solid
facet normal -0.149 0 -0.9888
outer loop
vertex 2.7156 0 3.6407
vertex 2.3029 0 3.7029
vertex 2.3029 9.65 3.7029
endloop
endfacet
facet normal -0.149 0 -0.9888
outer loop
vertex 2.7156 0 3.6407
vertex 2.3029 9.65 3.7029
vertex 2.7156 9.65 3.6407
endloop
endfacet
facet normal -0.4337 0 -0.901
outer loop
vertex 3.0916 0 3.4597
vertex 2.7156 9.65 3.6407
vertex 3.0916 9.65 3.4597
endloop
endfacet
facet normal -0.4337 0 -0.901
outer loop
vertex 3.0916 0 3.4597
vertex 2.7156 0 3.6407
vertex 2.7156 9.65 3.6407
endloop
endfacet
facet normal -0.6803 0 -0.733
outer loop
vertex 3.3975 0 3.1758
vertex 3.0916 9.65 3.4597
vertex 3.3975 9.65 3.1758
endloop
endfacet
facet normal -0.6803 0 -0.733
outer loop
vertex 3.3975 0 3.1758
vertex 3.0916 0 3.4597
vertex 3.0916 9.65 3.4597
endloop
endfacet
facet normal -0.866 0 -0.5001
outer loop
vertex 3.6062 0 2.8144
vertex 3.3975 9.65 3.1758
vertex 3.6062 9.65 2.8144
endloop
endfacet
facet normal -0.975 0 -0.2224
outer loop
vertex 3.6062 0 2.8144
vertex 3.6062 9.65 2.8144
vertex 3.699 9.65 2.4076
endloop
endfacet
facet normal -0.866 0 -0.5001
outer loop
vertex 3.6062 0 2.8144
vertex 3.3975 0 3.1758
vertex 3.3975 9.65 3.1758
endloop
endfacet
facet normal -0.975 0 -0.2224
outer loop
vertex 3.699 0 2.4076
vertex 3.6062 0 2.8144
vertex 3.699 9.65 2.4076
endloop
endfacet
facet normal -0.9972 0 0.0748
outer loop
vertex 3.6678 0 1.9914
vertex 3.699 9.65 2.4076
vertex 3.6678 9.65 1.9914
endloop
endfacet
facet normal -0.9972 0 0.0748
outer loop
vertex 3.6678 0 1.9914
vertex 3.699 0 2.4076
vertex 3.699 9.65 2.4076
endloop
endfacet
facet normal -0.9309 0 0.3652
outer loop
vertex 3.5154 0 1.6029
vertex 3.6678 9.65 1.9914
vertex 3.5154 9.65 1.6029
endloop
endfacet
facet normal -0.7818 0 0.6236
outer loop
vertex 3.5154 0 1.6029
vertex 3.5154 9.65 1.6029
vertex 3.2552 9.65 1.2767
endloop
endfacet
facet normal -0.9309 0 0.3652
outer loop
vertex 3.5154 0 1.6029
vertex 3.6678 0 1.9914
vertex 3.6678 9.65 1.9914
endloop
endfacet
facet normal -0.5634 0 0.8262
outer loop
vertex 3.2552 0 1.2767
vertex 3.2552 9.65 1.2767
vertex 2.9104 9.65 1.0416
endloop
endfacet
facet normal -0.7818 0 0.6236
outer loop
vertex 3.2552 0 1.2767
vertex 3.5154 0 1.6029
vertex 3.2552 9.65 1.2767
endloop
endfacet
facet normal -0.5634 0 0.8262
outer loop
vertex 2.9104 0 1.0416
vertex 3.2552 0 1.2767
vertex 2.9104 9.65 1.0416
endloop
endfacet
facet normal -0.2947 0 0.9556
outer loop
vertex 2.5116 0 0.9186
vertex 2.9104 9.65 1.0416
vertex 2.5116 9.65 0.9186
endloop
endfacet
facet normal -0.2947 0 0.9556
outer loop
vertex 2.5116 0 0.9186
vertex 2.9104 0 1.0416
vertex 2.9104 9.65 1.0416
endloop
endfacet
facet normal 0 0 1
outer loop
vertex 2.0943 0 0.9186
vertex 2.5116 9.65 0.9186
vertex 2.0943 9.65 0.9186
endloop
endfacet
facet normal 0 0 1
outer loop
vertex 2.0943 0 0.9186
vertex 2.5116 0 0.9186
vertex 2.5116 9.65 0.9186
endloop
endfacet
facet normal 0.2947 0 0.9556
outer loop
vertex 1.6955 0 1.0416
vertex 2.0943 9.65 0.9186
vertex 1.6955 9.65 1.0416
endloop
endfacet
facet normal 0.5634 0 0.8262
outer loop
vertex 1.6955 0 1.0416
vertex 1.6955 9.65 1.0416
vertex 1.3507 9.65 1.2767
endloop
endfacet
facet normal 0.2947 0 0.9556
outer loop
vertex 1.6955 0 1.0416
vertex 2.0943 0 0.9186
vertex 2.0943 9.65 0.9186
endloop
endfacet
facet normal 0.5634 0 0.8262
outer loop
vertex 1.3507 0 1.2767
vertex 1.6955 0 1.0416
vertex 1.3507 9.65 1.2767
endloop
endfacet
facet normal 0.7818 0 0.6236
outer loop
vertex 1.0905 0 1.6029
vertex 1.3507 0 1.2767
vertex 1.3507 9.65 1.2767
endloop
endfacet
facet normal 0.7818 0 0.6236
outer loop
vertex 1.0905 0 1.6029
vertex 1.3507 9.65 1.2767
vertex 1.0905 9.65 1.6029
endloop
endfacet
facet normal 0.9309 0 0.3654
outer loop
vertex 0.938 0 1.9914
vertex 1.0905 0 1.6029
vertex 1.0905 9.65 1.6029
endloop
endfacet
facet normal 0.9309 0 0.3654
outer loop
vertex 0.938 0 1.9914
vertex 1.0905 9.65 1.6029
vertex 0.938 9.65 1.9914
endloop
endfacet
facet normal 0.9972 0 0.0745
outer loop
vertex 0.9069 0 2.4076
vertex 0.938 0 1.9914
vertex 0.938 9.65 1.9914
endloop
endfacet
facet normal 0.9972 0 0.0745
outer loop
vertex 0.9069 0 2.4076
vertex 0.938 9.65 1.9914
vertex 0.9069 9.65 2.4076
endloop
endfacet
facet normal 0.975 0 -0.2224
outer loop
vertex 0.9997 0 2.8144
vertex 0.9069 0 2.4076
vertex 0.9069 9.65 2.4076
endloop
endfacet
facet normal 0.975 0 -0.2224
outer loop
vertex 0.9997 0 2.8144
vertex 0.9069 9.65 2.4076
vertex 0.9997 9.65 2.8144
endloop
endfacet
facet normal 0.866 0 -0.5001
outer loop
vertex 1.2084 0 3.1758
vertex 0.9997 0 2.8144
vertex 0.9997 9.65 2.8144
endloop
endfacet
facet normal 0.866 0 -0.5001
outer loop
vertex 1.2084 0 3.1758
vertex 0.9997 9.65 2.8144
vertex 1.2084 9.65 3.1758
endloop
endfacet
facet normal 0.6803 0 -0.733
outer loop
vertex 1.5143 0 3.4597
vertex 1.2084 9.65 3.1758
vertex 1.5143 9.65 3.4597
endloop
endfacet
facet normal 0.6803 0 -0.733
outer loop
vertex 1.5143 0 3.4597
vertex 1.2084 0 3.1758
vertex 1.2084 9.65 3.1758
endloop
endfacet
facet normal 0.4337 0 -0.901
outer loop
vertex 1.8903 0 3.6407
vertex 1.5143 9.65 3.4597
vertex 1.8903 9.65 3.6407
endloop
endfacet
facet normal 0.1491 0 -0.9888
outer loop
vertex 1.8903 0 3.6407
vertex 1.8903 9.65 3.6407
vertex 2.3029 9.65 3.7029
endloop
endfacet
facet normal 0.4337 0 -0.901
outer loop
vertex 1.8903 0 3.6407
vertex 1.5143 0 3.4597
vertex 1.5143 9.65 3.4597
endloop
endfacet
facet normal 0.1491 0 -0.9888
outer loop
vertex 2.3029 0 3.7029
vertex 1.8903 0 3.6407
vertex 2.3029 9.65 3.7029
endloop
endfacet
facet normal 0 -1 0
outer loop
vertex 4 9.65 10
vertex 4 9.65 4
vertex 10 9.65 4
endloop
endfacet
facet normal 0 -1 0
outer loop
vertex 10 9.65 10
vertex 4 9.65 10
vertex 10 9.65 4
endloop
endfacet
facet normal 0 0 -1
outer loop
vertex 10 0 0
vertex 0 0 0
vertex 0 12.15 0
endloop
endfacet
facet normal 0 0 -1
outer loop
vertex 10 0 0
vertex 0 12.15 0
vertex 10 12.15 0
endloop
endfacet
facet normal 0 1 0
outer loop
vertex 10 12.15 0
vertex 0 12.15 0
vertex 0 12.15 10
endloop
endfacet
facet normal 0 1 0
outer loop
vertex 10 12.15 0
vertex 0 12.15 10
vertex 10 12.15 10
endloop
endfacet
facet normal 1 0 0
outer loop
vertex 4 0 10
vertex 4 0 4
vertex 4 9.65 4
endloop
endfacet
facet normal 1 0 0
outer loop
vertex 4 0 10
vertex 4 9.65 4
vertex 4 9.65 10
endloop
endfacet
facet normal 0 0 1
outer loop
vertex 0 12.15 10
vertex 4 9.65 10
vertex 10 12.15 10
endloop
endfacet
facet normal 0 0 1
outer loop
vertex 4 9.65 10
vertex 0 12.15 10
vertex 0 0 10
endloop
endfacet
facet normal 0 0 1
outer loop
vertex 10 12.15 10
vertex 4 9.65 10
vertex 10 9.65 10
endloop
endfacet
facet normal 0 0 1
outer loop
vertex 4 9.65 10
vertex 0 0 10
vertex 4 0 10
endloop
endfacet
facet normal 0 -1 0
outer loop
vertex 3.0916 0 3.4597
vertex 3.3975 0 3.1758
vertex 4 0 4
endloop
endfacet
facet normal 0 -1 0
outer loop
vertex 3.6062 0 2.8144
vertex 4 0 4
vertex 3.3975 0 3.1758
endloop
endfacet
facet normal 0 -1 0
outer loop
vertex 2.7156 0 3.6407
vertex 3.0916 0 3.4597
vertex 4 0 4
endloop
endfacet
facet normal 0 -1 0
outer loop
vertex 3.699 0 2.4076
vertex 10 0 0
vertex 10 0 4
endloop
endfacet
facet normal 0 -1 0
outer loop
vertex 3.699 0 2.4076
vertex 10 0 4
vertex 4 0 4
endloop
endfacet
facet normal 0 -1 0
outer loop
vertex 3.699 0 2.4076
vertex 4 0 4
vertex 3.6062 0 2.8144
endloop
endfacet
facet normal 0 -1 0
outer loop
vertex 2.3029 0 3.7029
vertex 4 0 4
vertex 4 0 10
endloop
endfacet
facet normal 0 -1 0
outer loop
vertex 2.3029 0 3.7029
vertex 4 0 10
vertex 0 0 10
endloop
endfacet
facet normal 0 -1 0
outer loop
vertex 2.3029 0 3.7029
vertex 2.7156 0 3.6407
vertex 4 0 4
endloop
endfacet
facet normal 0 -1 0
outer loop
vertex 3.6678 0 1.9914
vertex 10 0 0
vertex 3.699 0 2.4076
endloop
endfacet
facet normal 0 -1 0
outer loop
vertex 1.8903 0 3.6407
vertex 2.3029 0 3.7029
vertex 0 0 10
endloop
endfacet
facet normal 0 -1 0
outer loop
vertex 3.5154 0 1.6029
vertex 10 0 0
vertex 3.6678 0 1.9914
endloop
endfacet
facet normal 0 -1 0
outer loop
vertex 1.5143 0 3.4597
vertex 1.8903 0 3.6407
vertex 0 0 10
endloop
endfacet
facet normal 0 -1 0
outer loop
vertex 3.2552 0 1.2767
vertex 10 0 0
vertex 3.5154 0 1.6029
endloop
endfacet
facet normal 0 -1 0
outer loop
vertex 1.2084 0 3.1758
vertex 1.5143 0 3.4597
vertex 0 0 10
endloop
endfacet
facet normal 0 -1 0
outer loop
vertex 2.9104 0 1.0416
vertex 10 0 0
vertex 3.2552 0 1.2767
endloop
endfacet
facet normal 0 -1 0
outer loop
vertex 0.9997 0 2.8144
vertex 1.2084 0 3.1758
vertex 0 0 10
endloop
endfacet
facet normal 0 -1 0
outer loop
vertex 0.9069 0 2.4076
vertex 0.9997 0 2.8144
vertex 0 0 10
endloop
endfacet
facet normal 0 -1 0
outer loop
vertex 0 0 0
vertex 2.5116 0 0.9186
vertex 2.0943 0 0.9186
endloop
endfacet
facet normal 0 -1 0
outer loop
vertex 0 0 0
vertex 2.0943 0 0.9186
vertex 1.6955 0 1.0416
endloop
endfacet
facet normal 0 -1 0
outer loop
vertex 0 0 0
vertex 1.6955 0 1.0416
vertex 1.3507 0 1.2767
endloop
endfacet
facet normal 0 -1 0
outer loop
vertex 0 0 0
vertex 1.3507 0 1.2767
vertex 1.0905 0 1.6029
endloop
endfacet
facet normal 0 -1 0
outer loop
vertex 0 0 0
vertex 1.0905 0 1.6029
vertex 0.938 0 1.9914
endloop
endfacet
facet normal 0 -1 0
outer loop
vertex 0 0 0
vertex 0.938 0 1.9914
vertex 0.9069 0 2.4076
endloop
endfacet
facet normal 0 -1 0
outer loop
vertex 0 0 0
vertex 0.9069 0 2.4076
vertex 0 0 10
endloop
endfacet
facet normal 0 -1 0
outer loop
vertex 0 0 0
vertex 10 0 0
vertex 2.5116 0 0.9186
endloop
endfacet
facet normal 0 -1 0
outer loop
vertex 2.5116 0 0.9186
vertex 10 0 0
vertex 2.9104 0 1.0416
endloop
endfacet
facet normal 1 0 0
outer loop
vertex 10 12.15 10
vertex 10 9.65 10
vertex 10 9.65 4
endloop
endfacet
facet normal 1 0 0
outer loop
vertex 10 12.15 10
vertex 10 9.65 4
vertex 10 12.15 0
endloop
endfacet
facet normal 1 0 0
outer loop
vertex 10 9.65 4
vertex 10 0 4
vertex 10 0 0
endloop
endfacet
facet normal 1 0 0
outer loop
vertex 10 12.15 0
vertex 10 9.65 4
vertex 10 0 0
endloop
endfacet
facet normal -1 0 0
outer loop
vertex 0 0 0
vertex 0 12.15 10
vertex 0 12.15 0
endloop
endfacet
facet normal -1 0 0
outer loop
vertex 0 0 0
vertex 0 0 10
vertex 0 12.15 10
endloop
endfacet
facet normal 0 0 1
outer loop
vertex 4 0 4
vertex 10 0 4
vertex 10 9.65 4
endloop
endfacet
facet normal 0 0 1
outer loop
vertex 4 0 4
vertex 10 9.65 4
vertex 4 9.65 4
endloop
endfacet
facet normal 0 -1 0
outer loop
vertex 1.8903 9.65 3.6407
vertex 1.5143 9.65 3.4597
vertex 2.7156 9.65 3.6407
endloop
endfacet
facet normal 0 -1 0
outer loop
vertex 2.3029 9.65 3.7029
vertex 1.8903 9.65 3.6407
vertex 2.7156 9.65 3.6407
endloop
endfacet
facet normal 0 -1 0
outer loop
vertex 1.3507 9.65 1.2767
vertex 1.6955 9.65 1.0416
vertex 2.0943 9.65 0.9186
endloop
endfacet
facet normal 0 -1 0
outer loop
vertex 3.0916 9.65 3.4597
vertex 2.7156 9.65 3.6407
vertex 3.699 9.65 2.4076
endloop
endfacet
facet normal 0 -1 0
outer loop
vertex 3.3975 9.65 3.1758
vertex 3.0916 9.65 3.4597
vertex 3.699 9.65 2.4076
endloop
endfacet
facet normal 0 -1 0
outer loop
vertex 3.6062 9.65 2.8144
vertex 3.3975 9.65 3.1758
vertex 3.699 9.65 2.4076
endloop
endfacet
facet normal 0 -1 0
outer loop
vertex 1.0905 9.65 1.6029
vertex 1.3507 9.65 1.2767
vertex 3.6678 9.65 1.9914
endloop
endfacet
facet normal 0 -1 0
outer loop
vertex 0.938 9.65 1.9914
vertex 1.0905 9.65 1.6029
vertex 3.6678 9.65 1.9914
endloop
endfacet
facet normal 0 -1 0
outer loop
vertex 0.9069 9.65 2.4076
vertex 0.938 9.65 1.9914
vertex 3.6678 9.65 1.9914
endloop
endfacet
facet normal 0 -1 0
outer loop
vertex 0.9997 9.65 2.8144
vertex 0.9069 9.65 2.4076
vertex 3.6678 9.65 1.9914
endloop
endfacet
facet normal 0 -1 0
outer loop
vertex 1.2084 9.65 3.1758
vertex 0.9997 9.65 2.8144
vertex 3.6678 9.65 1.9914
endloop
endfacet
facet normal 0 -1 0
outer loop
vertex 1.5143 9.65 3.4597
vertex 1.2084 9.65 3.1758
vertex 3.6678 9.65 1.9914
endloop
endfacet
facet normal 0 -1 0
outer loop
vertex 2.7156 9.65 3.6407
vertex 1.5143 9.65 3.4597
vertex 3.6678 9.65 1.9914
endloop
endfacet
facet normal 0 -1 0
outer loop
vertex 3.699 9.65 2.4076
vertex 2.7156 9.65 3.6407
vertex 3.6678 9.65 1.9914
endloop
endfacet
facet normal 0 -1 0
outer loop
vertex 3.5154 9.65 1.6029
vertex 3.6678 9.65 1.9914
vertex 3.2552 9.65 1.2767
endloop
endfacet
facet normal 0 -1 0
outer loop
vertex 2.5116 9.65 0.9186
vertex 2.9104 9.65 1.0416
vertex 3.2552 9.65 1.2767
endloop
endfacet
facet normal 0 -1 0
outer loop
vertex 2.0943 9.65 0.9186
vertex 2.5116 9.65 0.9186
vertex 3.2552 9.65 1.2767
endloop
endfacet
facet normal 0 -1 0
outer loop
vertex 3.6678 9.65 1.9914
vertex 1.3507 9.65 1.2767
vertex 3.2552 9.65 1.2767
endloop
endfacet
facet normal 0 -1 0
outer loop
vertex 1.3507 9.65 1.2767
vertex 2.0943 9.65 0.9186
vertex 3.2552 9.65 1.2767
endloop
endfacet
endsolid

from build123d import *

# Parameters (mm, degrees)
SKETCH1_R           = 1.4
BOSS_EXTRUDE1_DEPTH = 9.65
SKETCH2_W           = 10
SKETCH2_H           = 10
BOSS_EXTRUDE2_DEPTH = 2.5


with BuildPart() as part:
    # Sketch1 → Boss-Extrude1 (new body)
    with BuildSketch(Plane(origin=(0, 0, 0), x_dir=(1, 0, 0), z_dir=(0, 1, 0))):
        Polygon((0, 0), (10, 0), (10, -4), (4, -4), (4, -10), (0, -10), align=None)
        with Locations(Location((2.302943725, -2.302943725, 0), (0, 0, 270))):
            Circle(SKETCH1_R, mode=Mode.SUBTRACT)
    extrude(amount=BOSS_EXTRUDE1_DEPTH)

    # Sketch2 → Boss-Extrude2 (add)
    with BuildSketch(Plane(origin=(0, 9.65, 0), x_dir=(1, 0, 0), z_dir=(0, 1, 0))):
        with Locations((5, -5)):
            Rectangle(SKETCH2_W, SKETCH2_H)
    extrude(amount=BOSS_EXTRUDE2_DEPTH)


solid = part.part
